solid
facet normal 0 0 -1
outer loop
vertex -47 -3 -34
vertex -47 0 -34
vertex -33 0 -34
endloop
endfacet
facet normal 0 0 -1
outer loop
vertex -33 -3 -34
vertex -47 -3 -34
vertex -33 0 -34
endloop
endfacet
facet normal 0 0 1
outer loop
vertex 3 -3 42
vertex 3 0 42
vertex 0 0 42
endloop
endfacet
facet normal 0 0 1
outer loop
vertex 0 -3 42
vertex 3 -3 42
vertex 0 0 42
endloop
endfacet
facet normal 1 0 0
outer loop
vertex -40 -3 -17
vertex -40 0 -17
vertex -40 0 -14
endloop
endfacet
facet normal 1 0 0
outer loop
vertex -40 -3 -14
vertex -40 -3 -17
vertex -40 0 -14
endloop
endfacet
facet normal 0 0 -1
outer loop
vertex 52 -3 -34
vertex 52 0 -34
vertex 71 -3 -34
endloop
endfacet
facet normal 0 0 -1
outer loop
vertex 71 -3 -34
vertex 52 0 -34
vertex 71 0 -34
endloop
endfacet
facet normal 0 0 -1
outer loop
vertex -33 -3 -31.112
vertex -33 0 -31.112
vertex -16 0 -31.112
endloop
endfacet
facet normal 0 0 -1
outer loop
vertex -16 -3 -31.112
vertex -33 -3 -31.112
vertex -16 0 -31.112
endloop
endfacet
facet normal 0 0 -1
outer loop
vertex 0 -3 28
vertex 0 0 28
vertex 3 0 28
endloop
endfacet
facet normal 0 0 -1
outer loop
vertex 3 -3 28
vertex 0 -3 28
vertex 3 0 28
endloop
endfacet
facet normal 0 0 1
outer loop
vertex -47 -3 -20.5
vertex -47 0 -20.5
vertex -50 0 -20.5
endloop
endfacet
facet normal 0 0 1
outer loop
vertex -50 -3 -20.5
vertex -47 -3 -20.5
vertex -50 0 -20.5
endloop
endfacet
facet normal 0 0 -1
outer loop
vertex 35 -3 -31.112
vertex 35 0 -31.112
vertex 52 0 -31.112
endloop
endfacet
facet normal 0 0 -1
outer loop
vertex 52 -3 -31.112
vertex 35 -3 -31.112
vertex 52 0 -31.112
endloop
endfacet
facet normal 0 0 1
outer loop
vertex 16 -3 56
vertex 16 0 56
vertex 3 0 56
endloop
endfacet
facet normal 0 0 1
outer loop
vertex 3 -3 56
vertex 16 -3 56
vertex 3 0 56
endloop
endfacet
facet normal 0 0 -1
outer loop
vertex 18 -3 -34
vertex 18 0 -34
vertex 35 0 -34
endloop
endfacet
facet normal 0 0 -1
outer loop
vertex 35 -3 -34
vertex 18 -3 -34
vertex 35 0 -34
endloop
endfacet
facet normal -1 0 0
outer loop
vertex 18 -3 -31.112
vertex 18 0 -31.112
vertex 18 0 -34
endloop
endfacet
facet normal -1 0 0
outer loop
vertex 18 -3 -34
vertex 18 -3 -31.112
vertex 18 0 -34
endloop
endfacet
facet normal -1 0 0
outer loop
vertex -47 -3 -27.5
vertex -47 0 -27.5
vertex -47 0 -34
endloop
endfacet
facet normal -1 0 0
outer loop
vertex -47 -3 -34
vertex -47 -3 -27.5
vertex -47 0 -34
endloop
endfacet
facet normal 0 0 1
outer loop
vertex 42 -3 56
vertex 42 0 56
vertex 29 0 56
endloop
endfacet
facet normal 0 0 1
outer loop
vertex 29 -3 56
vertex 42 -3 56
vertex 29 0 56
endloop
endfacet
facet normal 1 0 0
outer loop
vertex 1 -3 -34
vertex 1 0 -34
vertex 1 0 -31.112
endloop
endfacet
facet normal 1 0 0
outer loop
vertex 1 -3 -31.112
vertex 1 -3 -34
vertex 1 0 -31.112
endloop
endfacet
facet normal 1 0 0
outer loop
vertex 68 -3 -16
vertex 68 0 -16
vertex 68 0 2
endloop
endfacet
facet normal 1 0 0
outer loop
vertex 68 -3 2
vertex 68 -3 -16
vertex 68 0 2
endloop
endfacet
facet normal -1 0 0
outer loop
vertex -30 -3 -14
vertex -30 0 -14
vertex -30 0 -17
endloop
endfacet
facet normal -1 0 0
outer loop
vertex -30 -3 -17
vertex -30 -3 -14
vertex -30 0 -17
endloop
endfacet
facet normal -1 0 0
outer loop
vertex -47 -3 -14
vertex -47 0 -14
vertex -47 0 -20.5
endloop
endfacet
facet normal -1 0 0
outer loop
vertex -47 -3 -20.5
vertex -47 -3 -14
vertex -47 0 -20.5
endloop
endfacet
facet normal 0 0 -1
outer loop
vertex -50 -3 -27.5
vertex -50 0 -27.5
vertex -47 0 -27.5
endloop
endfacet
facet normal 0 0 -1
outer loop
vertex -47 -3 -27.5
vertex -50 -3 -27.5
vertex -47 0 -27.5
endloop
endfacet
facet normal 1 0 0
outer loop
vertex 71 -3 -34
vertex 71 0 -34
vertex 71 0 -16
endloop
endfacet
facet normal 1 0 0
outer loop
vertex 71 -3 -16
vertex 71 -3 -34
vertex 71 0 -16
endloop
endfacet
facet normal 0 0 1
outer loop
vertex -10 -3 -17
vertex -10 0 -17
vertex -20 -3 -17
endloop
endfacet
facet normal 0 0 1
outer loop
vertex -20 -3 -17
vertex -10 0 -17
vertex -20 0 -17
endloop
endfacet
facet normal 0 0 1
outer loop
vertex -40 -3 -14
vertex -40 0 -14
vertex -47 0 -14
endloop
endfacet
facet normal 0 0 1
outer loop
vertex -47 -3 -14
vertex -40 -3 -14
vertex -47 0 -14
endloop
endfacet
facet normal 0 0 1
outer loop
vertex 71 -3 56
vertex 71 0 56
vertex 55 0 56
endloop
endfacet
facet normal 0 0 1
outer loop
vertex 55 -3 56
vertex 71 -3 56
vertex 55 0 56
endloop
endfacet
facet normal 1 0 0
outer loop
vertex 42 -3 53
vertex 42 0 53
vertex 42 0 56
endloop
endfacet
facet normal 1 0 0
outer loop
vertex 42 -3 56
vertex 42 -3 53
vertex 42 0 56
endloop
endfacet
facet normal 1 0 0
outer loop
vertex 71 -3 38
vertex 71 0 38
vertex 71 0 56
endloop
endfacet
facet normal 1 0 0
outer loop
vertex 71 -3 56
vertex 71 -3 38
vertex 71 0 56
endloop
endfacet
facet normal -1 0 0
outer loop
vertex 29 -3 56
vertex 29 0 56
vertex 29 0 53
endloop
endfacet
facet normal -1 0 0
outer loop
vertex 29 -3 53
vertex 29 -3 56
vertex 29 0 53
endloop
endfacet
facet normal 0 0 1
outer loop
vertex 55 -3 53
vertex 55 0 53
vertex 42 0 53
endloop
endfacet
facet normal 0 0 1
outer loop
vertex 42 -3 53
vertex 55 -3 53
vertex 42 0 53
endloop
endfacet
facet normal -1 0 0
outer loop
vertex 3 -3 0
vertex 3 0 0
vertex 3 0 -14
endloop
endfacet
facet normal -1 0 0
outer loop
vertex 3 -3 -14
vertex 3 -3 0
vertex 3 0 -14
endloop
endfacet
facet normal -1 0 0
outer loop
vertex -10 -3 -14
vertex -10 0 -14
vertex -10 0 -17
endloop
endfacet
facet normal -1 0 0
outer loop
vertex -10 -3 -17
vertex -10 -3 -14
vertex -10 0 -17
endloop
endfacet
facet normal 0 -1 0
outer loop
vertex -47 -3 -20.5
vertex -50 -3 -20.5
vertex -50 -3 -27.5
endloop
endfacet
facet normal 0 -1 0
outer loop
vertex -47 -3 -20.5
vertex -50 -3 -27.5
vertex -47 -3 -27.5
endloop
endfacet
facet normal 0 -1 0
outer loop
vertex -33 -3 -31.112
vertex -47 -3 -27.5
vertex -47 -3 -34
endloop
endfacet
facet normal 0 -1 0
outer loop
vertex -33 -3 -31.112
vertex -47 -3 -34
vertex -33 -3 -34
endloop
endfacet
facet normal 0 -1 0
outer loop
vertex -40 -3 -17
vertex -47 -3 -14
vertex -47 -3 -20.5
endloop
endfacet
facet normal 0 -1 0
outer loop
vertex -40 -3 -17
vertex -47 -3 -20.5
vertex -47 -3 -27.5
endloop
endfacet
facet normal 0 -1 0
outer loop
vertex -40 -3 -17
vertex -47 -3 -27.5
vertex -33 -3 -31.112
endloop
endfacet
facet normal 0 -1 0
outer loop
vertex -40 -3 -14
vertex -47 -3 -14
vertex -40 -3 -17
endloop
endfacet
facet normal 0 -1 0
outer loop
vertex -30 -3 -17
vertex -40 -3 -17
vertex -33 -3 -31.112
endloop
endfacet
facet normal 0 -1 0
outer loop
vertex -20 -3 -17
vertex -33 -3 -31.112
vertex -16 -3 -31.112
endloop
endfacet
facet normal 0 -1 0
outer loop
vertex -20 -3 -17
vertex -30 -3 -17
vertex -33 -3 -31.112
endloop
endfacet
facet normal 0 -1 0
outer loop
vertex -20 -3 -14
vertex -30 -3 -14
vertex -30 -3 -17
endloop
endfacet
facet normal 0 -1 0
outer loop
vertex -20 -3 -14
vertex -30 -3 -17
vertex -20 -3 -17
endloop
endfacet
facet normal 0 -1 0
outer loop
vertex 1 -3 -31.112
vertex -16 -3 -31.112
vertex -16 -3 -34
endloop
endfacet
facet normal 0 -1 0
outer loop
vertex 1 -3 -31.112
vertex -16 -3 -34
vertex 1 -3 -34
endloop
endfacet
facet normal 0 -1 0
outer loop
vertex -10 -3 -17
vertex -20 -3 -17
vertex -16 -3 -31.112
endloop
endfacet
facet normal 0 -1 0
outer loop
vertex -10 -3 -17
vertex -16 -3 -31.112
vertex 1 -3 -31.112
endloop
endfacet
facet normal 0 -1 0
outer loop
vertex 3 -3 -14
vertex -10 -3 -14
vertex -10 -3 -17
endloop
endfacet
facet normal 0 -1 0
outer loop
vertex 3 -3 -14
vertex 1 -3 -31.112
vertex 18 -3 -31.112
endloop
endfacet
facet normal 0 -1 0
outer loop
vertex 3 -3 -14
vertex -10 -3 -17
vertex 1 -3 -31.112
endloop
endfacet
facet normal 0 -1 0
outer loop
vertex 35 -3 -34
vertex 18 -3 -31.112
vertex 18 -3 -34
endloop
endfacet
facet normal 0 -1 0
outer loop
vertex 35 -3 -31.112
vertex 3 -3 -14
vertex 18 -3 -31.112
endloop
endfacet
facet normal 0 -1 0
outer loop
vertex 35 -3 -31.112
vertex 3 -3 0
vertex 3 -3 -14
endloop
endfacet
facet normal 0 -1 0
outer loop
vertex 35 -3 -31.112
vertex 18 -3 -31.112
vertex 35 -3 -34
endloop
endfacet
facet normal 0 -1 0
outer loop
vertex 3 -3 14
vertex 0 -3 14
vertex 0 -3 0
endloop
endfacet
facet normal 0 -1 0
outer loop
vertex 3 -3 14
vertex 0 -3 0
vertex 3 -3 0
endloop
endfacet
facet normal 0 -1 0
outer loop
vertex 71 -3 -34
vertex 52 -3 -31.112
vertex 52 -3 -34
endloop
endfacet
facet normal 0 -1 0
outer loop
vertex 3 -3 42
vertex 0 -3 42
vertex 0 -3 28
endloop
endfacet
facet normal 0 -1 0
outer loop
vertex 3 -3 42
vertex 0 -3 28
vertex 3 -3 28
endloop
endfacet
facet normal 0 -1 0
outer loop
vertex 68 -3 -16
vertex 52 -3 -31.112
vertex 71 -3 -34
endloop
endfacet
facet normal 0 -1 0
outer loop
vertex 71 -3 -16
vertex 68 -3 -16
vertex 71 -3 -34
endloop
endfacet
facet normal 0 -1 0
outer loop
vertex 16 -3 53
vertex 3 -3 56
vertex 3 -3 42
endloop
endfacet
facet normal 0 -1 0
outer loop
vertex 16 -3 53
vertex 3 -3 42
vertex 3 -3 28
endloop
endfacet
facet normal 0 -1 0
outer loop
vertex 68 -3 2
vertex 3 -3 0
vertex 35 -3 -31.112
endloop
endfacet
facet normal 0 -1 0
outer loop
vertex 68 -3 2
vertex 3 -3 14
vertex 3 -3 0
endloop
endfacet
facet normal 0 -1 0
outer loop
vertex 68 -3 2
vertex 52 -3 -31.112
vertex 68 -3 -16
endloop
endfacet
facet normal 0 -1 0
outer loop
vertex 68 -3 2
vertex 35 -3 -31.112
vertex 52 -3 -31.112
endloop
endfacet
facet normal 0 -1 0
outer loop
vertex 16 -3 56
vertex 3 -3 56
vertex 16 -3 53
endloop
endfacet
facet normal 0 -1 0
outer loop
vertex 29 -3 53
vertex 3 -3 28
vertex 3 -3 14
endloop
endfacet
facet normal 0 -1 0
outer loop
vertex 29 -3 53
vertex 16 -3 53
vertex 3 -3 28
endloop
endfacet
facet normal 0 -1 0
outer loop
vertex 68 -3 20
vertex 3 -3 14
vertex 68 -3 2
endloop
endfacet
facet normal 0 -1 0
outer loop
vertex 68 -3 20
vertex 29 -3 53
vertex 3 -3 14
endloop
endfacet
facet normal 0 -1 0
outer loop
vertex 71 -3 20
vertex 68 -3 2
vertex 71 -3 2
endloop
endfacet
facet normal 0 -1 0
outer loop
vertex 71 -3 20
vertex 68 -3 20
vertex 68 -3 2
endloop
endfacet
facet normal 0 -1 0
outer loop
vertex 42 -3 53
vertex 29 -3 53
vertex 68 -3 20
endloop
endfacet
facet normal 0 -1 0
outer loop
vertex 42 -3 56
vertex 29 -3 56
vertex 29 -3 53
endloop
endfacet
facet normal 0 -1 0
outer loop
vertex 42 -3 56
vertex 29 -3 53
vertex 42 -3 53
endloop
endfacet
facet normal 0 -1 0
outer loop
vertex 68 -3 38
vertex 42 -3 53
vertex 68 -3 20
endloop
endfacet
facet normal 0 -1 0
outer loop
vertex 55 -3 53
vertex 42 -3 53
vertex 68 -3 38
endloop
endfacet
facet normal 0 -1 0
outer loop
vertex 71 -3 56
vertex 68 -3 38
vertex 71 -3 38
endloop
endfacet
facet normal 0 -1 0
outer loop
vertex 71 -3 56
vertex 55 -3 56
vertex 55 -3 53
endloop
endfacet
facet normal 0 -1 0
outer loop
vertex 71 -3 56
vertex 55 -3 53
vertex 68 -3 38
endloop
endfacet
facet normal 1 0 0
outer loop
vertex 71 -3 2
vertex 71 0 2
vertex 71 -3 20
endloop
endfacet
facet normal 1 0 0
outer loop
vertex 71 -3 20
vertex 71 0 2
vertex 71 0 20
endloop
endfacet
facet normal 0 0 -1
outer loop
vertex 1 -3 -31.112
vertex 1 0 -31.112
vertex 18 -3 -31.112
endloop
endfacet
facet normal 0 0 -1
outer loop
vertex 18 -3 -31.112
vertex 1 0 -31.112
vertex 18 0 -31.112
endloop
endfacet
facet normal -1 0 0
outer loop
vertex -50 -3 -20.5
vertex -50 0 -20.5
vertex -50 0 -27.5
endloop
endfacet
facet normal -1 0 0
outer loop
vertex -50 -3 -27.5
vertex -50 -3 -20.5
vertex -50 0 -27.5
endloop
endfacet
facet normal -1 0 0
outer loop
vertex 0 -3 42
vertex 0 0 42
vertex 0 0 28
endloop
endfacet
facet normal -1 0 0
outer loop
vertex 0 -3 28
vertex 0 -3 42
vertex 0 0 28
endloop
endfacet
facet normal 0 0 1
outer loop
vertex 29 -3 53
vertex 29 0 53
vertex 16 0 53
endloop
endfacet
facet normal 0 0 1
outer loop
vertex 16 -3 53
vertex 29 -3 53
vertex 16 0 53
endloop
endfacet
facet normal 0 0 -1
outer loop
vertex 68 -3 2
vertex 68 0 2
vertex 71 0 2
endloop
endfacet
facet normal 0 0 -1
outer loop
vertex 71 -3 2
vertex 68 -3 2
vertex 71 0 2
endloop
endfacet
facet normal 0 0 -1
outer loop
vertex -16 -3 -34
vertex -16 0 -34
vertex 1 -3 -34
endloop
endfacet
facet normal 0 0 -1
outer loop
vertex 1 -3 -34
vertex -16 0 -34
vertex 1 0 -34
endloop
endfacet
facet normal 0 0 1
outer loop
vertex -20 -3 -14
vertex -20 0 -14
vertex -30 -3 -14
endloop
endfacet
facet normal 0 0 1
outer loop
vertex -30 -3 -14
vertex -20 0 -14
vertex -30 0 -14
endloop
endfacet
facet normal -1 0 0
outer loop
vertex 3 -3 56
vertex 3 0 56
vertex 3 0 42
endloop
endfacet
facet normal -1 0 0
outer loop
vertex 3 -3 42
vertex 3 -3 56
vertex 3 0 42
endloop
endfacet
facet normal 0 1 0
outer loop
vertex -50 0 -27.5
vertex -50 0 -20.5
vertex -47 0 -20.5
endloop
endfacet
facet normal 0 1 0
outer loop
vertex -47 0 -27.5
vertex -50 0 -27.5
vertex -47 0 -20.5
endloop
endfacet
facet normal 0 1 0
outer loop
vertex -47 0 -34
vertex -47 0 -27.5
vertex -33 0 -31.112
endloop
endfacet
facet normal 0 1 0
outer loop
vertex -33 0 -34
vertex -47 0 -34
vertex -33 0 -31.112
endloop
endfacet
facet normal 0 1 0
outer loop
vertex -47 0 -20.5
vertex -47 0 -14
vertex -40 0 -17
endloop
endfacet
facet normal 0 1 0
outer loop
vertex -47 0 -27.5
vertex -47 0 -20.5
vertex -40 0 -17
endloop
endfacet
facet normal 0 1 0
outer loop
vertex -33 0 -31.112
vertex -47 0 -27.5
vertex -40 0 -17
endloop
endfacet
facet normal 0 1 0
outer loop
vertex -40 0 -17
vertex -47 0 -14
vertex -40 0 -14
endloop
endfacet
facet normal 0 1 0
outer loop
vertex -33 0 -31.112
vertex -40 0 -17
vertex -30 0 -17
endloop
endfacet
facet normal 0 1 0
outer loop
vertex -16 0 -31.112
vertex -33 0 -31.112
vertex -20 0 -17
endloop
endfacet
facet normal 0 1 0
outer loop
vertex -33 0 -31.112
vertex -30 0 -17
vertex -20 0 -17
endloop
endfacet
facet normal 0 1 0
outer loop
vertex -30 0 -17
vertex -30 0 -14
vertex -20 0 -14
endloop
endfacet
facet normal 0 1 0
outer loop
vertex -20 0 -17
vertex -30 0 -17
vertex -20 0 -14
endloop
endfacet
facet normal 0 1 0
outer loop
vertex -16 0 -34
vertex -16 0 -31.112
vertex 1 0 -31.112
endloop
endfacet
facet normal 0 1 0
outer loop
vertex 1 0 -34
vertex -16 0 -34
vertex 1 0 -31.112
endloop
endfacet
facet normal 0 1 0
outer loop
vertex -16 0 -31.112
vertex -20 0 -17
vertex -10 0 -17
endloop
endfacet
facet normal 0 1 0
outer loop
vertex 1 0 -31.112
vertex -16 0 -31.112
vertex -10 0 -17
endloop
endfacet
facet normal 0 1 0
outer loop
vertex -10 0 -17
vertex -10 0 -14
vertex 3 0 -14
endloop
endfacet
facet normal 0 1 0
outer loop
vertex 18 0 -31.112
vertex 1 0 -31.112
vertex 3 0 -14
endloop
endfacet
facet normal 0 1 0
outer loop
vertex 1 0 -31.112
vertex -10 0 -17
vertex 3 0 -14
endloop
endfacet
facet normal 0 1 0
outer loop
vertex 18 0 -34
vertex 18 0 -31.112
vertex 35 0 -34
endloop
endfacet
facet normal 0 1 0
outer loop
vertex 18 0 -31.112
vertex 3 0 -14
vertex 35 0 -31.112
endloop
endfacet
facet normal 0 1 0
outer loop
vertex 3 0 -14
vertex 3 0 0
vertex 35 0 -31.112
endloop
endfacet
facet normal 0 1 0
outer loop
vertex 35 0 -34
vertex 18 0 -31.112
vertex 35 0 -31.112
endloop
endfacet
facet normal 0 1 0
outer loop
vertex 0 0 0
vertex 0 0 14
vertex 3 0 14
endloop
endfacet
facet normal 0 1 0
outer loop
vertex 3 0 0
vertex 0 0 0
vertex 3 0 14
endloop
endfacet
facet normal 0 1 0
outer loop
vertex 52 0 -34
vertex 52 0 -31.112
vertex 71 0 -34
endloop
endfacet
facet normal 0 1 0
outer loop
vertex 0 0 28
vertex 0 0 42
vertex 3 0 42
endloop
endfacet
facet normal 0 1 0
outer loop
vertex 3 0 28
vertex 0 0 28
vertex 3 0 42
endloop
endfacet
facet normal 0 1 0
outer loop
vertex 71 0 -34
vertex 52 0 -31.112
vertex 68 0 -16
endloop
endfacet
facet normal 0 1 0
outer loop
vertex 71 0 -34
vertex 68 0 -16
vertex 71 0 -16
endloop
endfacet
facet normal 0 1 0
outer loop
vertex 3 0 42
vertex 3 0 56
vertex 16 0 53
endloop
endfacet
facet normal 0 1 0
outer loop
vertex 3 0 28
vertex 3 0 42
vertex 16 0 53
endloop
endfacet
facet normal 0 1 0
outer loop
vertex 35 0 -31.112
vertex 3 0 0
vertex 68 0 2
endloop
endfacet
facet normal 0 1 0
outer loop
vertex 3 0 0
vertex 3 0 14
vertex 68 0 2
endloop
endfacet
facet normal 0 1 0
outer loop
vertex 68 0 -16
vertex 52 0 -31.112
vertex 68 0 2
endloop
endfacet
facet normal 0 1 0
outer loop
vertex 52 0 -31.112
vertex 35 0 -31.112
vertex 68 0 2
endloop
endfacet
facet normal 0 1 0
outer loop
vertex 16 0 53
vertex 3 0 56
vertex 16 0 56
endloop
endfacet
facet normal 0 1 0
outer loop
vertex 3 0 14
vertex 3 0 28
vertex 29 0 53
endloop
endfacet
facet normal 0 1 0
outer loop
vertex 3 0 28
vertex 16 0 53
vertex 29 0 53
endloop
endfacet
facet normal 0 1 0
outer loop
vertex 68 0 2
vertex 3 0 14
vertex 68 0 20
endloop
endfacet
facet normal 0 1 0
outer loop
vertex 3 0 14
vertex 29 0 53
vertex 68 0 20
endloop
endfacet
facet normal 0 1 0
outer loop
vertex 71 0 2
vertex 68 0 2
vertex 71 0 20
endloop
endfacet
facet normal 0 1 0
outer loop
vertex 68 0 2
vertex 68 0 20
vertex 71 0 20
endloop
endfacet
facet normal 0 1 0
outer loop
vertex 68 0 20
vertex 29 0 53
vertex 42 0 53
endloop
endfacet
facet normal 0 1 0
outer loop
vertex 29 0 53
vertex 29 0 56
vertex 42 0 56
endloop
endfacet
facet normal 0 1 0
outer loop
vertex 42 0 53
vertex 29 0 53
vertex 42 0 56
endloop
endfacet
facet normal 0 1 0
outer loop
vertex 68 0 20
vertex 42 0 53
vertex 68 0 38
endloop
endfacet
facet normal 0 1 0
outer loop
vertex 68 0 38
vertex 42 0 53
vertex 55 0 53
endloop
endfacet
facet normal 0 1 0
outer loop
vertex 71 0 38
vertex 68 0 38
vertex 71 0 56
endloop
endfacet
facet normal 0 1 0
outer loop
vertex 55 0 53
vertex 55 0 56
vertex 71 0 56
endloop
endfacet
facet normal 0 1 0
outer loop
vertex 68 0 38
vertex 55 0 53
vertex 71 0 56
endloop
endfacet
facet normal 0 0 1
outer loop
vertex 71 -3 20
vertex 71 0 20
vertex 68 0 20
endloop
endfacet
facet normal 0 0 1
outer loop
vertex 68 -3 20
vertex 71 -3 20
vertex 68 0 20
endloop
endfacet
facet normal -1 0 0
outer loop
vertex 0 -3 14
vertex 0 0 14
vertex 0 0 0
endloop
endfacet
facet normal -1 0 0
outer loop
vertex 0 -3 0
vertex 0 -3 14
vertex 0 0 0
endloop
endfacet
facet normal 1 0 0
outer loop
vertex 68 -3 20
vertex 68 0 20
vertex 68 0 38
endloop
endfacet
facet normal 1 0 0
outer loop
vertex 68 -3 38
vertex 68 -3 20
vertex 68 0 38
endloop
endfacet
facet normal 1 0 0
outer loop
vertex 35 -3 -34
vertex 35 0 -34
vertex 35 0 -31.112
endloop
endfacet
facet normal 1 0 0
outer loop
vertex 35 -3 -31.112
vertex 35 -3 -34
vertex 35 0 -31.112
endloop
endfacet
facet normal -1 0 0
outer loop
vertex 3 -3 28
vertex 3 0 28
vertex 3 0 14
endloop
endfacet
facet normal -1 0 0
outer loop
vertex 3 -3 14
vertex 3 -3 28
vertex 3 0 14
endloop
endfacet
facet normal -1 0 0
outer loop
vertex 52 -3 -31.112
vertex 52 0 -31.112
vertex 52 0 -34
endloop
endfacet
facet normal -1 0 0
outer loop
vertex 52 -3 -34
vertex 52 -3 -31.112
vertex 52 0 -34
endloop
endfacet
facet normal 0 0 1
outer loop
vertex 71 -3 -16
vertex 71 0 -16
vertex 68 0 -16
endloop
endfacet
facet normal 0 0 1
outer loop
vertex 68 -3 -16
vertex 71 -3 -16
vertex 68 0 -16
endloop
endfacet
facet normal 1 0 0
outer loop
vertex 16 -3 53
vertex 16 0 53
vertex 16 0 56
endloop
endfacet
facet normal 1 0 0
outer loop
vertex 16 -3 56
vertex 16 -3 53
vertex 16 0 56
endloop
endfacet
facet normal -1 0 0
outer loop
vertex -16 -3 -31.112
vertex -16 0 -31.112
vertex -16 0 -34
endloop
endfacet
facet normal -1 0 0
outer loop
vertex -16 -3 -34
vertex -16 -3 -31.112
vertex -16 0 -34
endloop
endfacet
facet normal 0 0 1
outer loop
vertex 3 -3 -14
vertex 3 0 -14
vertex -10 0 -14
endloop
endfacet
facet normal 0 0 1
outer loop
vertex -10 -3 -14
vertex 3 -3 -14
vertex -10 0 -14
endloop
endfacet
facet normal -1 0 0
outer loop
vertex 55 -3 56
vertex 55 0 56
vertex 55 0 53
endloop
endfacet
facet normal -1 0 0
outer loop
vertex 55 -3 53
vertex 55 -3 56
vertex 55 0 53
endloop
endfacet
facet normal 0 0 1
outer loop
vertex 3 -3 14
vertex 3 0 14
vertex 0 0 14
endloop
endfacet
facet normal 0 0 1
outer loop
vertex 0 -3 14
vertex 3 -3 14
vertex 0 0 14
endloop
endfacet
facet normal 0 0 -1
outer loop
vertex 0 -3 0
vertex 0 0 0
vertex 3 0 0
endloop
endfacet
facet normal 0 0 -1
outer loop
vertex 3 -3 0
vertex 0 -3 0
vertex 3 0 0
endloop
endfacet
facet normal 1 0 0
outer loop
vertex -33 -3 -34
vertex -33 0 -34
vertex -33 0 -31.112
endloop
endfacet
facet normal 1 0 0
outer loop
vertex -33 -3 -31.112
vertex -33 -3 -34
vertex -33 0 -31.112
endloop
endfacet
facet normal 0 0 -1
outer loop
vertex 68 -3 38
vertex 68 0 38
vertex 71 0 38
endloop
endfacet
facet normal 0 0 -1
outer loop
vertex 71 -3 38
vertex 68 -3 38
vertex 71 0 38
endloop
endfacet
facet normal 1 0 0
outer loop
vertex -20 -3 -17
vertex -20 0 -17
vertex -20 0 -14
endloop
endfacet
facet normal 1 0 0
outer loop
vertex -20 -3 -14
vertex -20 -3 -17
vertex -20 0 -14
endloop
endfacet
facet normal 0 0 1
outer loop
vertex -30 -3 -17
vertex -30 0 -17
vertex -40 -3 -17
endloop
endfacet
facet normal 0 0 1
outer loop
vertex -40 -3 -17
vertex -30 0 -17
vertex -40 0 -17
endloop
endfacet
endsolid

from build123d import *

# Parameters (mm, degrees)
F1_DEPTH = 3


with BuildPart() as f1:
    # F0 (on Front) → F1 (new body)
    with BuildSketch(Plane.XZ):
        Polygon((16, 56), (3, 56), (3, 42), (0, 42), (0, 28), (3, 28), (3, 14), (0, 14), (0, 0), (3, 0), (3, -14), (0, -14), (-10, -14), (-10, -17), (-20, -17), (-20, -14), (-30, -14), (-30, -17), (-40, -17), (-40, -14), (-47, -14), (-47, -20.5), (-50, -20.5), (-50, -27.5), (-47, -27.5), (-47, -34), (-33, -34), (-33, -31.112283), (-16, -31.112283), (-16, -34), (1, -34), (1, -31.112283), (18, -31.112283), (18, -34), (35, -34), (35, -31.112283), (52, -31.112283), (52, -34), (71, -34), (71, -16), (68, -16), (68, 2), (71, 2), (71, 20), (68, 20), (68, 38), (71, 38), (71, 56), (55, 56), (55, 53), (42, 53), (42, 56), (29, 56), (29, 53), (16, 53), align=None)
    extrude(amount=F1_DEPTH)


solid = f1.part
